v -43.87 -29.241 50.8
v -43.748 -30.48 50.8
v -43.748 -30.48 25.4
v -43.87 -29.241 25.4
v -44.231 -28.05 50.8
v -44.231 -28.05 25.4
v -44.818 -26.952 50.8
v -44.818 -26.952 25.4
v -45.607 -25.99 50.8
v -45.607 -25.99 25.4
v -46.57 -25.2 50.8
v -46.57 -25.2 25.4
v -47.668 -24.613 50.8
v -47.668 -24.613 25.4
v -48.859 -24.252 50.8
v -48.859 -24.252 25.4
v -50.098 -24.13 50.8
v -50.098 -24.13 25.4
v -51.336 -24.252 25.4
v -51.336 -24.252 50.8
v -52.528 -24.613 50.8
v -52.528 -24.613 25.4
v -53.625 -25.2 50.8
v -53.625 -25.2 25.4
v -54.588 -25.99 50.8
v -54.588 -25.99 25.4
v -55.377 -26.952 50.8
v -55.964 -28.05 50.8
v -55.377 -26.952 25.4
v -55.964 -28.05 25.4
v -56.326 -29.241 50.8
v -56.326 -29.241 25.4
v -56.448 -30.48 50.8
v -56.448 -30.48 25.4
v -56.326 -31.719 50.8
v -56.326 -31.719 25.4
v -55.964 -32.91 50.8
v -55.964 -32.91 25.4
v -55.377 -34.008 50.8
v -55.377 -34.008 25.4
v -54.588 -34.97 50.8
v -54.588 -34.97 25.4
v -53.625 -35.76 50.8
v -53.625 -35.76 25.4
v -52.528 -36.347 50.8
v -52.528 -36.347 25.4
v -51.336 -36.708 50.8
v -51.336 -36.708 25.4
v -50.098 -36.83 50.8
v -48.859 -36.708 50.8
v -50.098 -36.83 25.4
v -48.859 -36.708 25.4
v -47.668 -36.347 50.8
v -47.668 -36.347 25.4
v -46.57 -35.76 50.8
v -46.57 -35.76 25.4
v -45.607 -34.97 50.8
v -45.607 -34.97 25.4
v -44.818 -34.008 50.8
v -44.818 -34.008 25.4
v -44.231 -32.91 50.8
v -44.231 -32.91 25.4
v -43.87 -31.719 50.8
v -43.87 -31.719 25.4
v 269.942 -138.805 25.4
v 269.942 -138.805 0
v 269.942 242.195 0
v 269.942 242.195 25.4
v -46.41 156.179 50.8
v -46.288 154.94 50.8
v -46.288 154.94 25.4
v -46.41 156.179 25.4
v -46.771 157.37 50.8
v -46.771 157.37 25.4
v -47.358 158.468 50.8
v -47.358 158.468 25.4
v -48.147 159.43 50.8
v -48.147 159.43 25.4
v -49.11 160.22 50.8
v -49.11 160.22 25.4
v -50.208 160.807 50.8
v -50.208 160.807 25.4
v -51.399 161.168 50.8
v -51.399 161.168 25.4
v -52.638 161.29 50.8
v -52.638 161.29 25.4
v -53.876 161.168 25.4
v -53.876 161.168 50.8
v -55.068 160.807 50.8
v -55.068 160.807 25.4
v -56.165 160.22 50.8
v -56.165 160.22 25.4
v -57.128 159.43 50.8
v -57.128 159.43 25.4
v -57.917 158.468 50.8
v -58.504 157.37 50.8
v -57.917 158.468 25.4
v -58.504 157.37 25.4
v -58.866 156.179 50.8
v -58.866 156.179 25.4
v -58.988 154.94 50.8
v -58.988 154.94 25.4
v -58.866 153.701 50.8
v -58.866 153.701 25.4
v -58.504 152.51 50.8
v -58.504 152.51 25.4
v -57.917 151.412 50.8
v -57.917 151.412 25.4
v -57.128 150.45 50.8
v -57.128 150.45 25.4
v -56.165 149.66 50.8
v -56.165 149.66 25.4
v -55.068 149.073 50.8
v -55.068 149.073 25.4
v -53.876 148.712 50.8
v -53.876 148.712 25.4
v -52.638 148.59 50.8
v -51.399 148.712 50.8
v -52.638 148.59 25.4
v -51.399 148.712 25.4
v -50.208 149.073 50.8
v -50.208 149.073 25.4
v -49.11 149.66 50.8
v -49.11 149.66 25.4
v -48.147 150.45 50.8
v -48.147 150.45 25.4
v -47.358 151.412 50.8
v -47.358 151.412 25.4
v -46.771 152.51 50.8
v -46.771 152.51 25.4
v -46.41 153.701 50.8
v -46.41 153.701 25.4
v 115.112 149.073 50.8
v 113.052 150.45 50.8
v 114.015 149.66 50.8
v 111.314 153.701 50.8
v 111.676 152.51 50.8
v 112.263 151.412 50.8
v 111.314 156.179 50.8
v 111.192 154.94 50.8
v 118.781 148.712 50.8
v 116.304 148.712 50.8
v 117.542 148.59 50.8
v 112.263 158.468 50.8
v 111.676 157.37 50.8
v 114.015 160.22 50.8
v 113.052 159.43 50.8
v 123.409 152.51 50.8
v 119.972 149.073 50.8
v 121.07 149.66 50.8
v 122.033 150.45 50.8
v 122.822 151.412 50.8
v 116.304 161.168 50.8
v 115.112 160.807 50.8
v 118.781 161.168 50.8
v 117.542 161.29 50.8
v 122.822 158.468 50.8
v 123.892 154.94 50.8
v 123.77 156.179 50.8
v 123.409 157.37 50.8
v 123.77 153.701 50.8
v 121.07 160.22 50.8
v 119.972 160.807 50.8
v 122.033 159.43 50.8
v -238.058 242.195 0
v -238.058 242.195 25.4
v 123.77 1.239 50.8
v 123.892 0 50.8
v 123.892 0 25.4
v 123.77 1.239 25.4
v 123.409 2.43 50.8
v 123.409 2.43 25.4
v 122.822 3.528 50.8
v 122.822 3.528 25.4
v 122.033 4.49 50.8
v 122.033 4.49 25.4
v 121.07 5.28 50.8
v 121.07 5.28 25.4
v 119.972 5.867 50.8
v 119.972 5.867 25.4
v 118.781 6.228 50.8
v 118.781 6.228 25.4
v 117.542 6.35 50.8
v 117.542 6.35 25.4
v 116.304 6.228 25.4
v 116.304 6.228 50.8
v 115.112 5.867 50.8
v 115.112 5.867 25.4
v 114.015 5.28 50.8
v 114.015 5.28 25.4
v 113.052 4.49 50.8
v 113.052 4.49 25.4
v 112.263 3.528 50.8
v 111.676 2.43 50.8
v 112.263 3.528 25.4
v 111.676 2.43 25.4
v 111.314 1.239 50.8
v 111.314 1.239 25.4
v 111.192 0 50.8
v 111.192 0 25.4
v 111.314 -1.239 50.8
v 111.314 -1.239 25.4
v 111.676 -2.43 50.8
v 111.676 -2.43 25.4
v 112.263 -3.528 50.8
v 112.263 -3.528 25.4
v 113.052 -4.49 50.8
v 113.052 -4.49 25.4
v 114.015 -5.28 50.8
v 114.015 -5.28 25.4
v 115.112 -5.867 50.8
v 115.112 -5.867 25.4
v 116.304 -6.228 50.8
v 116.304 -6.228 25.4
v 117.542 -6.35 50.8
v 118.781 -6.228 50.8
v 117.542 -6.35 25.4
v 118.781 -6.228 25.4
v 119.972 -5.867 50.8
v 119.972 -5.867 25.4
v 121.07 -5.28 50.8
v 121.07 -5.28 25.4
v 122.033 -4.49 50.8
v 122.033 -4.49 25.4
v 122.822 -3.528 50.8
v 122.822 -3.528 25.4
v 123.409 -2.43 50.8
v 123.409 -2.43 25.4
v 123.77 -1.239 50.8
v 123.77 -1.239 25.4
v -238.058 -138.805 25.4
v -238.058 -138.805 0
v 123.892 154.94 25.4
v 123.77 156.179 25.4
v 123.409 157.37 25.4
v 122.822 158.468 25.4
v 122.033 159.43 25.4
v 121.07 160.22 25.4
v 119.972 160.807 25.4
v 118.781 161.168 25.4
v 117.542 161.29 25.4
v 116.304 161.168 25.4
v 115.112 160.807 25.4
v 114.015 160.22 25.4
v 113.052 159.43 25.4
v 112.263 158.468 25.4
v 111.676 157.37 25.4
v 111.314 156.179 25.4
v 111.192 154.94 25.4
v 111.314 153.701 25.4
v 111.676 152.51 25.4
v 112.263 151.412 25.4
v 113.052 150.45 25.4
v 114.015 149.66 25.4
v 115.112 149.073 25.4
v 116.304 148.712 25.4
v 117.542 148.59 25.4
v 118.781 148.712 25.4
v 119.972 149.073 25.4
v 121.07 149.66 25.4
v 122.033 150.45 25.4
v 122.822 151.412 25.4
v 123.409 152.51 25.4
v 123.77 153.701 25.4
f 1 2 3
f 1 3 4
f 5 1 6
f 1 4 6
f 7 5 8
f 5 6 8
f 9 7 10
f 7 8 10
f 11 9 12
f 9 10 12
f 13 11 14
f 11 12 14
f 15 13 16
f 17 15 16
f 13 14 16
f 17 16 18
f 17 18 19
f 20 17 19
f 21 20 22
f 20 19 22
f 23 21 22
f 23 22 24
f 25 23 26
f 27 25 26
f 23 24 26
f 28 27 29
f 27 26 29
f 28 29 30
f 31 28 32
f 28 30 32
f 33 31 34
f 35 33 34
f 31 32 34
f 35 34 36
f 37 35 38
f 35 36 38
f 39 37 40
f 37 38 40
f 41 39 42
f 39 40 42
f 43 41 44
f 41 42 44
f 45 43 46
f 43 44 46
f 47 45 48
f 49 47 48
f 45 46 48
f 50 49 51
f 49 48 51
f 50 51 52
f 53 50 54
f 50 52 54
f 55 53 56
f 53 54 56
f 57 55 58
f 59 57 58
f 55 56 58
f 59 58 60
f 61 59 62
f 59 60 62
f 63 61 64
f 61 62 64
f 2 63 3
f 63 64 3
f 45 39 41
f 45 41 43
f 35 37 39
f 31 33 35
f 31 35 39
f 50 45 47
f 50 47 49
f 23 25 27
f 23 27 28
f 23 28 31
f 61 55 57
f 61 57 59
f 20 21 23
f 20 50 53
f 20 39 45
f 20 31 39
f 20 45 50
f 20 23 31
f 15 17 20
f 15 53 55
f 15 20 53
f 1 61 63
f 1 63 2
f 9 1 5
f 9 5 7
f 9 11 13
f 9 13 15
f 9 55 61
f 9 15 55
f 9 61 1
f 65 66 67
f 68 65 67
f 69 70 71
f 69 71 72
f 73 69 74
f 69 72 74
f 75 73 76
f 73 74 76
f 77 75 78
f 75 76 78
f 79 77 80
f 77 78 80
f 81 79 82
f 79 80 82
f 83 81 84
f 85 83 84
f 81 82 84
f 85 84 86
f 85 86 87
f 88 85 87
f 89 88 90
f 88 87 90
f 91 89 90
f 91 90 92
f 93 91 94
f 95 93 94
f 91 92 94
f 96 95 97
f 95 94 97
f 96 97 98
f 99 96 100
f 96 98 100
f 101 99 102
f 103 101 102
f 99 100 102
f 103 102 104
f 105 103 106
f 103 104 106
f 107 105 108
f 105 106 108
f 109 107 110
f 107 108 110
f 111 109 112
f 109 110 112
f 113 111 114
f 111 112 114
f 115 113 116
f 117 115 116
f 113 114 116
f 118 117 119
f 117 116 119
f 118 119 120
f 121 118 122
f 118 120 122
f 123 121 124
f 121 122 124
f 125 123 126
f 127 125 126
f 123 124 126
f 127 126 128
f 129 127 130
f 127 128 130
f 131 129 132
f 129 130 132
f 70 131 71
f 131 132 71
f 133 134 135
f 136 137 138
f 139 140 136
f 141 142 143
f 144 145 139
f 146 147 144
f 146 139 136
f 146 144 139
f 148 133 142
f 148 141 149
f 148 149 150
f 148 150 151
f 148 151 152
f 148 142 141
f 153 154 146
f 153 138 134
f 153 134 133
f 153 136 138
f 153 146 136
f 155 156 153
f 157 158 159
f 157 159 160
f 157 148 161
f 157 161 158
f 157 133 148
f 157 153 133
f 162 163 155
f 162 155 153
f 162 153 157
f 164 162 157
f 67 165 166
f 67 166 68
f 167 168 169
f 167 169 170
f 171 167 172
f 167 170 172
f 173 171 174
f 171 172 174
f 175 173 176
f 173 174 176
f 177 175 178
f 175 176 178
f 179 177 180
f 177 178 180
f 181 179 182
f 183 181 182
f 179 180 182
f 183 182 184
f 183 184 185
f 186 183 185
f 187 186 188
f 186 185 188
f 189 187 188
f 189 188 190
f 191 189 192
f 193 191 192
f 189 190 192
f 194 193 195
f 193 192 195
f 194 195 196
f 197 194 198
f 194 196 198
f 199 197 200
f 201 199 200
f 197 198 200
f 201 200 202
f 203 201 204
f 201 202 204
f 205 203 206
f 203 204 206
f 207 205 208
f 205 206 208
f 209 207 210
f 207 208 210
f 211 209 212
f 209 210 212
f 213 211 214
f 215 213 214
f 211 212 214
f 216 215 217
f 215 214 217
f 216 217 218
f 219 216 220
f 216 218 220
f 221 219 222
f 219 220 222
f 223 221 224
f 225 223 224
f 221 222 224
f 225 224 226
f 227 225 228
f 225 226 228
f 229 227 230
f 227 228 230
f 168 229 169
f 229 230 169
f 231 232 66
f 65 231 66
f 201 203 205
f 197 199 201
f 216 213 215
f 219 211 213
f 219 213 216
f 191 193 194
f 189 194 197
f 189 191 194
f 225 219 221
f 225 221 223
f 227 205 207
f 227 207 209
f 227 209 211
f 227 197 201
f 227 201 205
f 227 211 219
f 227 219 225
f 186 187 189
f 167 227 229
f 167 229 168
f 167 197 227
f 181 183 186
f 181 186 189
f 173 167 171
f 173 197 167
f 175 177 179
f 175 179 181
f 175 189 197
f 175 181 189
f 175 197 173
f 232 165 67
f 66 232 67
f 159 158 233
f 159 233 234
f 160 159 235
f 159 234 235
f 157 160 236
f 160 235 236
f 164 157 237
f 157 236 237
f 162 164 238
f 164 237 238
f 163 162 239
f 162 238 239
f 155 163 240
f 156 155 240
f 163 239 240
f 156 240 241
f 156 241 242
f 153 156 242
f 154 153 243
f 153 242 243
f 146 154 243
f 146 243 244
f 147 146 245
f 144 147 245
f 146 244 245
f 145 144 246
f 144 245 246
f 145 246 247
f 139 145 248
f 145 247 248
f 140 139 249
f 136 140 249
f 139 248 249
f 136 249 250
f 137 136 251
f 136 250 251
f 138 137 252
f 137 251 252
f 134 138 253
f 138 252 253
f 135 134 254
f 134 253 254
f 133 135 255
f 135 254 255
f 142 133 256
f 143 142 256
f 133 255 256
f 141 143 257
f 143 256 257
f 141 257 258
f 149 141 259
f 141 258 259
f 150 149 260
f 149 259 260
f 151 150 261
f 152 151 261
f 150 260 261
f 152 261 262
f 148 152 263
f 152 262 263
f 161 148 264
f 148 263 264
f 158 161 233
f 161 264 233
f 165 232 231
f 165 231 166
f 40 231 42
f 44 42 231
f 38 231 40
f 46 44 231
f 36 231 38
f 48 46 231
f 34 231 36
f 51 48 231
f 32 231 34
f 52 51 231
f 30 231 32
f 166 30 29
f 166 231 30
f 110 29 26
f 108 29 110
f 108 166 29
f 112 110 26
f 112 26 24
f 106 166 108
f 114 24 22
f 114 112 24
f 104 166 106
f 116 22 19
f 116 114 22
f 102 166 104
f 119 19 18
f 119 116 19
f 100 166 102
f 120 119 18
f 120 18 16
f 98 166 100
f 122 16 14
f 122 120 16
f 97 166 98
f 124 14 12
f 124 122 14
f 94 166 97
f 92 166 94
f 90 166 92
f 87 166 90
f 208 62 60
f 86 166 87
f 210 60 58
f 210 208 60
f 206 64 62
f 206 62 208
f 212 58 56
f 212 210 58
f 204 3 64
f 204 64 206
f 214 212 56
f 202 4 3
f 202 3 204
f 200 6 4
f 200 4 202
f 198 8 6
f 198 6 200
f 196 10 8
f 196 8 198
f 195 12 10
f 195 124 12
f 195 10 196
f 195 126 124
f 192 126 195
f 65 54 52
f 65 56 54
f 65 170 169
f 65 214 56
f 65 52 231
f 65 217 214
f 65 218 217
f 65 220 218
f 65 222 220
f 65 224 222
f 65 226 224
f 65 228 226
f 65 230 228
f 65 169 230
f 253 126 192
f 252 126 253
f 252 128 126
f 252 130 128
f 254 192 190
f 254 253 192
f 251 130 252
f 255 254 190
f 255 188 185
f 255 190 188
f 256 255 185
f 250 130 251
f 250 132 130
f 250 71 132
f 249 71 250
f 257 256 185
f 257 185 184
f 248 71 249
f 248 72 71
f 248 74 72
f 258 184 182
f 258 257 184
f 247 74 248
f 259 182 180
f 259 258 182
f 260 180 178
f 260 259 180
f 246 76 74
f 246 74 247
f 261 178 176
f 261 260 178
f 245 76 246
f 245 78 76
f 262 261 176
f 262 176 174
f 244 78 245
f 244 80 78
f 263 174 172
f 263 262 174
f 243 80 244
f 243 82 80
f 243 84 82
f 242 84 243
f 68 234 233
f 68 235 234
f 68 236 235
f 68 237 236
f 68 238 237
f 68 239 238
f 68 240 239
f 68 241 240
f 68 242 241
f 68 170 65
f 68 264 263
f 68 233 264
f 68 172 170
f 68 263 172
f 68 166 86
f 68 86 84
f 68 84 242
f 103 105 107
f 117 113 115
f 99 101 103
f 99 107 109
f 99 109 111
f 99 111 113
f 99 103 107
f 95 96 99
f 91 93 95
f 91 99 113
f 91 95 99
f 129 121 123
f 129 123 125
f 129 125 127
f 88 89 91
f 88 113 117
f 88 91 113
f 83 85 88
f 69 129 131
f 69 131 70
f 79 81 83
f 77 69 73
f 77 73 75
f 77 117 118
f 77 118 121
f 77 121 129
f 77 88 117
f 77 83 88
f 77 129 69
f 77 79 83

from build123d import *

# Parameters (mm, degrees)
F0_W       = 508
F0_H       = 381
F1_DEPTH   = 25.4
F2_R       = 6.35
F3_DEPTH   = 25.4
F1_FACE1_W = 508
F1_FACE1_H = 381
F4_DEPTH   = 25.4
F5_DEPTH   = 25.4


# Not quite as in the source:
# - a feature names something its author has since deleted; it is built from what else it names


with BuildPart() as f1:
    # F0 (on Top) → F1 (new body)
    with BuildSketch(Plane.XY):
        with Locations((15.942402184, 51.6951617887)):
            Rectangle(F0_W, F0_H)
    extrude(amount=F1_DEPTH)

    # F2 (on face) → F3 (join)
    with BuildSketch(Plane.XY.offset(25.4)):
        with Locations((-52.637597816, 154.94)):
            Circle(F2_R)
        with Locations((117.542402184, 154.94)):
            Circle(F2_R)
        with Locations((117.542402184, 0)):
            Circle(F2_R)
    extrude(amount=F3_DEPTH)

    # F2 (on face) + F1_face1 (on face) → F4 (join)
    with BuildSketch(Plane.XY.offset(25.4)):
        with Locations((-52.637597816, 154.94)):
            Circle(F2_R)
        with Locations((117.542402184, 154.94)):
            Circle(F2_R)
        with Locations((117.542402184, 0)):
            Circle(F2_R)
        with Locations((-50.097597816, -30.48)):
            Circle(F2_R)
    with BuildSketch(Plane(origin=(15.942402184, 51.6951617887, 0), x_dir=(1, 0, 0), z_dir=(0, 0, -1))):
        Rectangle(F1_FACE1_W, F1_FACE1_H)
    extrude(amount=F4_DEPTH, dir=(0, 0, 1))

    # F2 (on face) + F1_face1 (on face) → F5 (join)
    with BuildSketch(Plane.XY.offset(25.4)):
        with Locations((-52.637597816, 154.94)):
            Circle(F2_R)
        with Locations((117.542402184, 154.94)):
            Circle(F2_R)
        with Locations((117.542402184, 0)):
            Circle(F2_R)
        with Locations((-50.097597816, -30.48)):
            Circle(F2_R)
    with BuildSketch(Plane(origin=(15.942402184, 51.6951617887, 0), x_dir=(1, 0, 0), z_dir=(0, 0, -1))):
        Rectangle(F1_FACE1_W, F1_FACE1_H)
    extrude(amount=F5_DEPTH, dir=(0, 0, 1))


solid = f1.part
